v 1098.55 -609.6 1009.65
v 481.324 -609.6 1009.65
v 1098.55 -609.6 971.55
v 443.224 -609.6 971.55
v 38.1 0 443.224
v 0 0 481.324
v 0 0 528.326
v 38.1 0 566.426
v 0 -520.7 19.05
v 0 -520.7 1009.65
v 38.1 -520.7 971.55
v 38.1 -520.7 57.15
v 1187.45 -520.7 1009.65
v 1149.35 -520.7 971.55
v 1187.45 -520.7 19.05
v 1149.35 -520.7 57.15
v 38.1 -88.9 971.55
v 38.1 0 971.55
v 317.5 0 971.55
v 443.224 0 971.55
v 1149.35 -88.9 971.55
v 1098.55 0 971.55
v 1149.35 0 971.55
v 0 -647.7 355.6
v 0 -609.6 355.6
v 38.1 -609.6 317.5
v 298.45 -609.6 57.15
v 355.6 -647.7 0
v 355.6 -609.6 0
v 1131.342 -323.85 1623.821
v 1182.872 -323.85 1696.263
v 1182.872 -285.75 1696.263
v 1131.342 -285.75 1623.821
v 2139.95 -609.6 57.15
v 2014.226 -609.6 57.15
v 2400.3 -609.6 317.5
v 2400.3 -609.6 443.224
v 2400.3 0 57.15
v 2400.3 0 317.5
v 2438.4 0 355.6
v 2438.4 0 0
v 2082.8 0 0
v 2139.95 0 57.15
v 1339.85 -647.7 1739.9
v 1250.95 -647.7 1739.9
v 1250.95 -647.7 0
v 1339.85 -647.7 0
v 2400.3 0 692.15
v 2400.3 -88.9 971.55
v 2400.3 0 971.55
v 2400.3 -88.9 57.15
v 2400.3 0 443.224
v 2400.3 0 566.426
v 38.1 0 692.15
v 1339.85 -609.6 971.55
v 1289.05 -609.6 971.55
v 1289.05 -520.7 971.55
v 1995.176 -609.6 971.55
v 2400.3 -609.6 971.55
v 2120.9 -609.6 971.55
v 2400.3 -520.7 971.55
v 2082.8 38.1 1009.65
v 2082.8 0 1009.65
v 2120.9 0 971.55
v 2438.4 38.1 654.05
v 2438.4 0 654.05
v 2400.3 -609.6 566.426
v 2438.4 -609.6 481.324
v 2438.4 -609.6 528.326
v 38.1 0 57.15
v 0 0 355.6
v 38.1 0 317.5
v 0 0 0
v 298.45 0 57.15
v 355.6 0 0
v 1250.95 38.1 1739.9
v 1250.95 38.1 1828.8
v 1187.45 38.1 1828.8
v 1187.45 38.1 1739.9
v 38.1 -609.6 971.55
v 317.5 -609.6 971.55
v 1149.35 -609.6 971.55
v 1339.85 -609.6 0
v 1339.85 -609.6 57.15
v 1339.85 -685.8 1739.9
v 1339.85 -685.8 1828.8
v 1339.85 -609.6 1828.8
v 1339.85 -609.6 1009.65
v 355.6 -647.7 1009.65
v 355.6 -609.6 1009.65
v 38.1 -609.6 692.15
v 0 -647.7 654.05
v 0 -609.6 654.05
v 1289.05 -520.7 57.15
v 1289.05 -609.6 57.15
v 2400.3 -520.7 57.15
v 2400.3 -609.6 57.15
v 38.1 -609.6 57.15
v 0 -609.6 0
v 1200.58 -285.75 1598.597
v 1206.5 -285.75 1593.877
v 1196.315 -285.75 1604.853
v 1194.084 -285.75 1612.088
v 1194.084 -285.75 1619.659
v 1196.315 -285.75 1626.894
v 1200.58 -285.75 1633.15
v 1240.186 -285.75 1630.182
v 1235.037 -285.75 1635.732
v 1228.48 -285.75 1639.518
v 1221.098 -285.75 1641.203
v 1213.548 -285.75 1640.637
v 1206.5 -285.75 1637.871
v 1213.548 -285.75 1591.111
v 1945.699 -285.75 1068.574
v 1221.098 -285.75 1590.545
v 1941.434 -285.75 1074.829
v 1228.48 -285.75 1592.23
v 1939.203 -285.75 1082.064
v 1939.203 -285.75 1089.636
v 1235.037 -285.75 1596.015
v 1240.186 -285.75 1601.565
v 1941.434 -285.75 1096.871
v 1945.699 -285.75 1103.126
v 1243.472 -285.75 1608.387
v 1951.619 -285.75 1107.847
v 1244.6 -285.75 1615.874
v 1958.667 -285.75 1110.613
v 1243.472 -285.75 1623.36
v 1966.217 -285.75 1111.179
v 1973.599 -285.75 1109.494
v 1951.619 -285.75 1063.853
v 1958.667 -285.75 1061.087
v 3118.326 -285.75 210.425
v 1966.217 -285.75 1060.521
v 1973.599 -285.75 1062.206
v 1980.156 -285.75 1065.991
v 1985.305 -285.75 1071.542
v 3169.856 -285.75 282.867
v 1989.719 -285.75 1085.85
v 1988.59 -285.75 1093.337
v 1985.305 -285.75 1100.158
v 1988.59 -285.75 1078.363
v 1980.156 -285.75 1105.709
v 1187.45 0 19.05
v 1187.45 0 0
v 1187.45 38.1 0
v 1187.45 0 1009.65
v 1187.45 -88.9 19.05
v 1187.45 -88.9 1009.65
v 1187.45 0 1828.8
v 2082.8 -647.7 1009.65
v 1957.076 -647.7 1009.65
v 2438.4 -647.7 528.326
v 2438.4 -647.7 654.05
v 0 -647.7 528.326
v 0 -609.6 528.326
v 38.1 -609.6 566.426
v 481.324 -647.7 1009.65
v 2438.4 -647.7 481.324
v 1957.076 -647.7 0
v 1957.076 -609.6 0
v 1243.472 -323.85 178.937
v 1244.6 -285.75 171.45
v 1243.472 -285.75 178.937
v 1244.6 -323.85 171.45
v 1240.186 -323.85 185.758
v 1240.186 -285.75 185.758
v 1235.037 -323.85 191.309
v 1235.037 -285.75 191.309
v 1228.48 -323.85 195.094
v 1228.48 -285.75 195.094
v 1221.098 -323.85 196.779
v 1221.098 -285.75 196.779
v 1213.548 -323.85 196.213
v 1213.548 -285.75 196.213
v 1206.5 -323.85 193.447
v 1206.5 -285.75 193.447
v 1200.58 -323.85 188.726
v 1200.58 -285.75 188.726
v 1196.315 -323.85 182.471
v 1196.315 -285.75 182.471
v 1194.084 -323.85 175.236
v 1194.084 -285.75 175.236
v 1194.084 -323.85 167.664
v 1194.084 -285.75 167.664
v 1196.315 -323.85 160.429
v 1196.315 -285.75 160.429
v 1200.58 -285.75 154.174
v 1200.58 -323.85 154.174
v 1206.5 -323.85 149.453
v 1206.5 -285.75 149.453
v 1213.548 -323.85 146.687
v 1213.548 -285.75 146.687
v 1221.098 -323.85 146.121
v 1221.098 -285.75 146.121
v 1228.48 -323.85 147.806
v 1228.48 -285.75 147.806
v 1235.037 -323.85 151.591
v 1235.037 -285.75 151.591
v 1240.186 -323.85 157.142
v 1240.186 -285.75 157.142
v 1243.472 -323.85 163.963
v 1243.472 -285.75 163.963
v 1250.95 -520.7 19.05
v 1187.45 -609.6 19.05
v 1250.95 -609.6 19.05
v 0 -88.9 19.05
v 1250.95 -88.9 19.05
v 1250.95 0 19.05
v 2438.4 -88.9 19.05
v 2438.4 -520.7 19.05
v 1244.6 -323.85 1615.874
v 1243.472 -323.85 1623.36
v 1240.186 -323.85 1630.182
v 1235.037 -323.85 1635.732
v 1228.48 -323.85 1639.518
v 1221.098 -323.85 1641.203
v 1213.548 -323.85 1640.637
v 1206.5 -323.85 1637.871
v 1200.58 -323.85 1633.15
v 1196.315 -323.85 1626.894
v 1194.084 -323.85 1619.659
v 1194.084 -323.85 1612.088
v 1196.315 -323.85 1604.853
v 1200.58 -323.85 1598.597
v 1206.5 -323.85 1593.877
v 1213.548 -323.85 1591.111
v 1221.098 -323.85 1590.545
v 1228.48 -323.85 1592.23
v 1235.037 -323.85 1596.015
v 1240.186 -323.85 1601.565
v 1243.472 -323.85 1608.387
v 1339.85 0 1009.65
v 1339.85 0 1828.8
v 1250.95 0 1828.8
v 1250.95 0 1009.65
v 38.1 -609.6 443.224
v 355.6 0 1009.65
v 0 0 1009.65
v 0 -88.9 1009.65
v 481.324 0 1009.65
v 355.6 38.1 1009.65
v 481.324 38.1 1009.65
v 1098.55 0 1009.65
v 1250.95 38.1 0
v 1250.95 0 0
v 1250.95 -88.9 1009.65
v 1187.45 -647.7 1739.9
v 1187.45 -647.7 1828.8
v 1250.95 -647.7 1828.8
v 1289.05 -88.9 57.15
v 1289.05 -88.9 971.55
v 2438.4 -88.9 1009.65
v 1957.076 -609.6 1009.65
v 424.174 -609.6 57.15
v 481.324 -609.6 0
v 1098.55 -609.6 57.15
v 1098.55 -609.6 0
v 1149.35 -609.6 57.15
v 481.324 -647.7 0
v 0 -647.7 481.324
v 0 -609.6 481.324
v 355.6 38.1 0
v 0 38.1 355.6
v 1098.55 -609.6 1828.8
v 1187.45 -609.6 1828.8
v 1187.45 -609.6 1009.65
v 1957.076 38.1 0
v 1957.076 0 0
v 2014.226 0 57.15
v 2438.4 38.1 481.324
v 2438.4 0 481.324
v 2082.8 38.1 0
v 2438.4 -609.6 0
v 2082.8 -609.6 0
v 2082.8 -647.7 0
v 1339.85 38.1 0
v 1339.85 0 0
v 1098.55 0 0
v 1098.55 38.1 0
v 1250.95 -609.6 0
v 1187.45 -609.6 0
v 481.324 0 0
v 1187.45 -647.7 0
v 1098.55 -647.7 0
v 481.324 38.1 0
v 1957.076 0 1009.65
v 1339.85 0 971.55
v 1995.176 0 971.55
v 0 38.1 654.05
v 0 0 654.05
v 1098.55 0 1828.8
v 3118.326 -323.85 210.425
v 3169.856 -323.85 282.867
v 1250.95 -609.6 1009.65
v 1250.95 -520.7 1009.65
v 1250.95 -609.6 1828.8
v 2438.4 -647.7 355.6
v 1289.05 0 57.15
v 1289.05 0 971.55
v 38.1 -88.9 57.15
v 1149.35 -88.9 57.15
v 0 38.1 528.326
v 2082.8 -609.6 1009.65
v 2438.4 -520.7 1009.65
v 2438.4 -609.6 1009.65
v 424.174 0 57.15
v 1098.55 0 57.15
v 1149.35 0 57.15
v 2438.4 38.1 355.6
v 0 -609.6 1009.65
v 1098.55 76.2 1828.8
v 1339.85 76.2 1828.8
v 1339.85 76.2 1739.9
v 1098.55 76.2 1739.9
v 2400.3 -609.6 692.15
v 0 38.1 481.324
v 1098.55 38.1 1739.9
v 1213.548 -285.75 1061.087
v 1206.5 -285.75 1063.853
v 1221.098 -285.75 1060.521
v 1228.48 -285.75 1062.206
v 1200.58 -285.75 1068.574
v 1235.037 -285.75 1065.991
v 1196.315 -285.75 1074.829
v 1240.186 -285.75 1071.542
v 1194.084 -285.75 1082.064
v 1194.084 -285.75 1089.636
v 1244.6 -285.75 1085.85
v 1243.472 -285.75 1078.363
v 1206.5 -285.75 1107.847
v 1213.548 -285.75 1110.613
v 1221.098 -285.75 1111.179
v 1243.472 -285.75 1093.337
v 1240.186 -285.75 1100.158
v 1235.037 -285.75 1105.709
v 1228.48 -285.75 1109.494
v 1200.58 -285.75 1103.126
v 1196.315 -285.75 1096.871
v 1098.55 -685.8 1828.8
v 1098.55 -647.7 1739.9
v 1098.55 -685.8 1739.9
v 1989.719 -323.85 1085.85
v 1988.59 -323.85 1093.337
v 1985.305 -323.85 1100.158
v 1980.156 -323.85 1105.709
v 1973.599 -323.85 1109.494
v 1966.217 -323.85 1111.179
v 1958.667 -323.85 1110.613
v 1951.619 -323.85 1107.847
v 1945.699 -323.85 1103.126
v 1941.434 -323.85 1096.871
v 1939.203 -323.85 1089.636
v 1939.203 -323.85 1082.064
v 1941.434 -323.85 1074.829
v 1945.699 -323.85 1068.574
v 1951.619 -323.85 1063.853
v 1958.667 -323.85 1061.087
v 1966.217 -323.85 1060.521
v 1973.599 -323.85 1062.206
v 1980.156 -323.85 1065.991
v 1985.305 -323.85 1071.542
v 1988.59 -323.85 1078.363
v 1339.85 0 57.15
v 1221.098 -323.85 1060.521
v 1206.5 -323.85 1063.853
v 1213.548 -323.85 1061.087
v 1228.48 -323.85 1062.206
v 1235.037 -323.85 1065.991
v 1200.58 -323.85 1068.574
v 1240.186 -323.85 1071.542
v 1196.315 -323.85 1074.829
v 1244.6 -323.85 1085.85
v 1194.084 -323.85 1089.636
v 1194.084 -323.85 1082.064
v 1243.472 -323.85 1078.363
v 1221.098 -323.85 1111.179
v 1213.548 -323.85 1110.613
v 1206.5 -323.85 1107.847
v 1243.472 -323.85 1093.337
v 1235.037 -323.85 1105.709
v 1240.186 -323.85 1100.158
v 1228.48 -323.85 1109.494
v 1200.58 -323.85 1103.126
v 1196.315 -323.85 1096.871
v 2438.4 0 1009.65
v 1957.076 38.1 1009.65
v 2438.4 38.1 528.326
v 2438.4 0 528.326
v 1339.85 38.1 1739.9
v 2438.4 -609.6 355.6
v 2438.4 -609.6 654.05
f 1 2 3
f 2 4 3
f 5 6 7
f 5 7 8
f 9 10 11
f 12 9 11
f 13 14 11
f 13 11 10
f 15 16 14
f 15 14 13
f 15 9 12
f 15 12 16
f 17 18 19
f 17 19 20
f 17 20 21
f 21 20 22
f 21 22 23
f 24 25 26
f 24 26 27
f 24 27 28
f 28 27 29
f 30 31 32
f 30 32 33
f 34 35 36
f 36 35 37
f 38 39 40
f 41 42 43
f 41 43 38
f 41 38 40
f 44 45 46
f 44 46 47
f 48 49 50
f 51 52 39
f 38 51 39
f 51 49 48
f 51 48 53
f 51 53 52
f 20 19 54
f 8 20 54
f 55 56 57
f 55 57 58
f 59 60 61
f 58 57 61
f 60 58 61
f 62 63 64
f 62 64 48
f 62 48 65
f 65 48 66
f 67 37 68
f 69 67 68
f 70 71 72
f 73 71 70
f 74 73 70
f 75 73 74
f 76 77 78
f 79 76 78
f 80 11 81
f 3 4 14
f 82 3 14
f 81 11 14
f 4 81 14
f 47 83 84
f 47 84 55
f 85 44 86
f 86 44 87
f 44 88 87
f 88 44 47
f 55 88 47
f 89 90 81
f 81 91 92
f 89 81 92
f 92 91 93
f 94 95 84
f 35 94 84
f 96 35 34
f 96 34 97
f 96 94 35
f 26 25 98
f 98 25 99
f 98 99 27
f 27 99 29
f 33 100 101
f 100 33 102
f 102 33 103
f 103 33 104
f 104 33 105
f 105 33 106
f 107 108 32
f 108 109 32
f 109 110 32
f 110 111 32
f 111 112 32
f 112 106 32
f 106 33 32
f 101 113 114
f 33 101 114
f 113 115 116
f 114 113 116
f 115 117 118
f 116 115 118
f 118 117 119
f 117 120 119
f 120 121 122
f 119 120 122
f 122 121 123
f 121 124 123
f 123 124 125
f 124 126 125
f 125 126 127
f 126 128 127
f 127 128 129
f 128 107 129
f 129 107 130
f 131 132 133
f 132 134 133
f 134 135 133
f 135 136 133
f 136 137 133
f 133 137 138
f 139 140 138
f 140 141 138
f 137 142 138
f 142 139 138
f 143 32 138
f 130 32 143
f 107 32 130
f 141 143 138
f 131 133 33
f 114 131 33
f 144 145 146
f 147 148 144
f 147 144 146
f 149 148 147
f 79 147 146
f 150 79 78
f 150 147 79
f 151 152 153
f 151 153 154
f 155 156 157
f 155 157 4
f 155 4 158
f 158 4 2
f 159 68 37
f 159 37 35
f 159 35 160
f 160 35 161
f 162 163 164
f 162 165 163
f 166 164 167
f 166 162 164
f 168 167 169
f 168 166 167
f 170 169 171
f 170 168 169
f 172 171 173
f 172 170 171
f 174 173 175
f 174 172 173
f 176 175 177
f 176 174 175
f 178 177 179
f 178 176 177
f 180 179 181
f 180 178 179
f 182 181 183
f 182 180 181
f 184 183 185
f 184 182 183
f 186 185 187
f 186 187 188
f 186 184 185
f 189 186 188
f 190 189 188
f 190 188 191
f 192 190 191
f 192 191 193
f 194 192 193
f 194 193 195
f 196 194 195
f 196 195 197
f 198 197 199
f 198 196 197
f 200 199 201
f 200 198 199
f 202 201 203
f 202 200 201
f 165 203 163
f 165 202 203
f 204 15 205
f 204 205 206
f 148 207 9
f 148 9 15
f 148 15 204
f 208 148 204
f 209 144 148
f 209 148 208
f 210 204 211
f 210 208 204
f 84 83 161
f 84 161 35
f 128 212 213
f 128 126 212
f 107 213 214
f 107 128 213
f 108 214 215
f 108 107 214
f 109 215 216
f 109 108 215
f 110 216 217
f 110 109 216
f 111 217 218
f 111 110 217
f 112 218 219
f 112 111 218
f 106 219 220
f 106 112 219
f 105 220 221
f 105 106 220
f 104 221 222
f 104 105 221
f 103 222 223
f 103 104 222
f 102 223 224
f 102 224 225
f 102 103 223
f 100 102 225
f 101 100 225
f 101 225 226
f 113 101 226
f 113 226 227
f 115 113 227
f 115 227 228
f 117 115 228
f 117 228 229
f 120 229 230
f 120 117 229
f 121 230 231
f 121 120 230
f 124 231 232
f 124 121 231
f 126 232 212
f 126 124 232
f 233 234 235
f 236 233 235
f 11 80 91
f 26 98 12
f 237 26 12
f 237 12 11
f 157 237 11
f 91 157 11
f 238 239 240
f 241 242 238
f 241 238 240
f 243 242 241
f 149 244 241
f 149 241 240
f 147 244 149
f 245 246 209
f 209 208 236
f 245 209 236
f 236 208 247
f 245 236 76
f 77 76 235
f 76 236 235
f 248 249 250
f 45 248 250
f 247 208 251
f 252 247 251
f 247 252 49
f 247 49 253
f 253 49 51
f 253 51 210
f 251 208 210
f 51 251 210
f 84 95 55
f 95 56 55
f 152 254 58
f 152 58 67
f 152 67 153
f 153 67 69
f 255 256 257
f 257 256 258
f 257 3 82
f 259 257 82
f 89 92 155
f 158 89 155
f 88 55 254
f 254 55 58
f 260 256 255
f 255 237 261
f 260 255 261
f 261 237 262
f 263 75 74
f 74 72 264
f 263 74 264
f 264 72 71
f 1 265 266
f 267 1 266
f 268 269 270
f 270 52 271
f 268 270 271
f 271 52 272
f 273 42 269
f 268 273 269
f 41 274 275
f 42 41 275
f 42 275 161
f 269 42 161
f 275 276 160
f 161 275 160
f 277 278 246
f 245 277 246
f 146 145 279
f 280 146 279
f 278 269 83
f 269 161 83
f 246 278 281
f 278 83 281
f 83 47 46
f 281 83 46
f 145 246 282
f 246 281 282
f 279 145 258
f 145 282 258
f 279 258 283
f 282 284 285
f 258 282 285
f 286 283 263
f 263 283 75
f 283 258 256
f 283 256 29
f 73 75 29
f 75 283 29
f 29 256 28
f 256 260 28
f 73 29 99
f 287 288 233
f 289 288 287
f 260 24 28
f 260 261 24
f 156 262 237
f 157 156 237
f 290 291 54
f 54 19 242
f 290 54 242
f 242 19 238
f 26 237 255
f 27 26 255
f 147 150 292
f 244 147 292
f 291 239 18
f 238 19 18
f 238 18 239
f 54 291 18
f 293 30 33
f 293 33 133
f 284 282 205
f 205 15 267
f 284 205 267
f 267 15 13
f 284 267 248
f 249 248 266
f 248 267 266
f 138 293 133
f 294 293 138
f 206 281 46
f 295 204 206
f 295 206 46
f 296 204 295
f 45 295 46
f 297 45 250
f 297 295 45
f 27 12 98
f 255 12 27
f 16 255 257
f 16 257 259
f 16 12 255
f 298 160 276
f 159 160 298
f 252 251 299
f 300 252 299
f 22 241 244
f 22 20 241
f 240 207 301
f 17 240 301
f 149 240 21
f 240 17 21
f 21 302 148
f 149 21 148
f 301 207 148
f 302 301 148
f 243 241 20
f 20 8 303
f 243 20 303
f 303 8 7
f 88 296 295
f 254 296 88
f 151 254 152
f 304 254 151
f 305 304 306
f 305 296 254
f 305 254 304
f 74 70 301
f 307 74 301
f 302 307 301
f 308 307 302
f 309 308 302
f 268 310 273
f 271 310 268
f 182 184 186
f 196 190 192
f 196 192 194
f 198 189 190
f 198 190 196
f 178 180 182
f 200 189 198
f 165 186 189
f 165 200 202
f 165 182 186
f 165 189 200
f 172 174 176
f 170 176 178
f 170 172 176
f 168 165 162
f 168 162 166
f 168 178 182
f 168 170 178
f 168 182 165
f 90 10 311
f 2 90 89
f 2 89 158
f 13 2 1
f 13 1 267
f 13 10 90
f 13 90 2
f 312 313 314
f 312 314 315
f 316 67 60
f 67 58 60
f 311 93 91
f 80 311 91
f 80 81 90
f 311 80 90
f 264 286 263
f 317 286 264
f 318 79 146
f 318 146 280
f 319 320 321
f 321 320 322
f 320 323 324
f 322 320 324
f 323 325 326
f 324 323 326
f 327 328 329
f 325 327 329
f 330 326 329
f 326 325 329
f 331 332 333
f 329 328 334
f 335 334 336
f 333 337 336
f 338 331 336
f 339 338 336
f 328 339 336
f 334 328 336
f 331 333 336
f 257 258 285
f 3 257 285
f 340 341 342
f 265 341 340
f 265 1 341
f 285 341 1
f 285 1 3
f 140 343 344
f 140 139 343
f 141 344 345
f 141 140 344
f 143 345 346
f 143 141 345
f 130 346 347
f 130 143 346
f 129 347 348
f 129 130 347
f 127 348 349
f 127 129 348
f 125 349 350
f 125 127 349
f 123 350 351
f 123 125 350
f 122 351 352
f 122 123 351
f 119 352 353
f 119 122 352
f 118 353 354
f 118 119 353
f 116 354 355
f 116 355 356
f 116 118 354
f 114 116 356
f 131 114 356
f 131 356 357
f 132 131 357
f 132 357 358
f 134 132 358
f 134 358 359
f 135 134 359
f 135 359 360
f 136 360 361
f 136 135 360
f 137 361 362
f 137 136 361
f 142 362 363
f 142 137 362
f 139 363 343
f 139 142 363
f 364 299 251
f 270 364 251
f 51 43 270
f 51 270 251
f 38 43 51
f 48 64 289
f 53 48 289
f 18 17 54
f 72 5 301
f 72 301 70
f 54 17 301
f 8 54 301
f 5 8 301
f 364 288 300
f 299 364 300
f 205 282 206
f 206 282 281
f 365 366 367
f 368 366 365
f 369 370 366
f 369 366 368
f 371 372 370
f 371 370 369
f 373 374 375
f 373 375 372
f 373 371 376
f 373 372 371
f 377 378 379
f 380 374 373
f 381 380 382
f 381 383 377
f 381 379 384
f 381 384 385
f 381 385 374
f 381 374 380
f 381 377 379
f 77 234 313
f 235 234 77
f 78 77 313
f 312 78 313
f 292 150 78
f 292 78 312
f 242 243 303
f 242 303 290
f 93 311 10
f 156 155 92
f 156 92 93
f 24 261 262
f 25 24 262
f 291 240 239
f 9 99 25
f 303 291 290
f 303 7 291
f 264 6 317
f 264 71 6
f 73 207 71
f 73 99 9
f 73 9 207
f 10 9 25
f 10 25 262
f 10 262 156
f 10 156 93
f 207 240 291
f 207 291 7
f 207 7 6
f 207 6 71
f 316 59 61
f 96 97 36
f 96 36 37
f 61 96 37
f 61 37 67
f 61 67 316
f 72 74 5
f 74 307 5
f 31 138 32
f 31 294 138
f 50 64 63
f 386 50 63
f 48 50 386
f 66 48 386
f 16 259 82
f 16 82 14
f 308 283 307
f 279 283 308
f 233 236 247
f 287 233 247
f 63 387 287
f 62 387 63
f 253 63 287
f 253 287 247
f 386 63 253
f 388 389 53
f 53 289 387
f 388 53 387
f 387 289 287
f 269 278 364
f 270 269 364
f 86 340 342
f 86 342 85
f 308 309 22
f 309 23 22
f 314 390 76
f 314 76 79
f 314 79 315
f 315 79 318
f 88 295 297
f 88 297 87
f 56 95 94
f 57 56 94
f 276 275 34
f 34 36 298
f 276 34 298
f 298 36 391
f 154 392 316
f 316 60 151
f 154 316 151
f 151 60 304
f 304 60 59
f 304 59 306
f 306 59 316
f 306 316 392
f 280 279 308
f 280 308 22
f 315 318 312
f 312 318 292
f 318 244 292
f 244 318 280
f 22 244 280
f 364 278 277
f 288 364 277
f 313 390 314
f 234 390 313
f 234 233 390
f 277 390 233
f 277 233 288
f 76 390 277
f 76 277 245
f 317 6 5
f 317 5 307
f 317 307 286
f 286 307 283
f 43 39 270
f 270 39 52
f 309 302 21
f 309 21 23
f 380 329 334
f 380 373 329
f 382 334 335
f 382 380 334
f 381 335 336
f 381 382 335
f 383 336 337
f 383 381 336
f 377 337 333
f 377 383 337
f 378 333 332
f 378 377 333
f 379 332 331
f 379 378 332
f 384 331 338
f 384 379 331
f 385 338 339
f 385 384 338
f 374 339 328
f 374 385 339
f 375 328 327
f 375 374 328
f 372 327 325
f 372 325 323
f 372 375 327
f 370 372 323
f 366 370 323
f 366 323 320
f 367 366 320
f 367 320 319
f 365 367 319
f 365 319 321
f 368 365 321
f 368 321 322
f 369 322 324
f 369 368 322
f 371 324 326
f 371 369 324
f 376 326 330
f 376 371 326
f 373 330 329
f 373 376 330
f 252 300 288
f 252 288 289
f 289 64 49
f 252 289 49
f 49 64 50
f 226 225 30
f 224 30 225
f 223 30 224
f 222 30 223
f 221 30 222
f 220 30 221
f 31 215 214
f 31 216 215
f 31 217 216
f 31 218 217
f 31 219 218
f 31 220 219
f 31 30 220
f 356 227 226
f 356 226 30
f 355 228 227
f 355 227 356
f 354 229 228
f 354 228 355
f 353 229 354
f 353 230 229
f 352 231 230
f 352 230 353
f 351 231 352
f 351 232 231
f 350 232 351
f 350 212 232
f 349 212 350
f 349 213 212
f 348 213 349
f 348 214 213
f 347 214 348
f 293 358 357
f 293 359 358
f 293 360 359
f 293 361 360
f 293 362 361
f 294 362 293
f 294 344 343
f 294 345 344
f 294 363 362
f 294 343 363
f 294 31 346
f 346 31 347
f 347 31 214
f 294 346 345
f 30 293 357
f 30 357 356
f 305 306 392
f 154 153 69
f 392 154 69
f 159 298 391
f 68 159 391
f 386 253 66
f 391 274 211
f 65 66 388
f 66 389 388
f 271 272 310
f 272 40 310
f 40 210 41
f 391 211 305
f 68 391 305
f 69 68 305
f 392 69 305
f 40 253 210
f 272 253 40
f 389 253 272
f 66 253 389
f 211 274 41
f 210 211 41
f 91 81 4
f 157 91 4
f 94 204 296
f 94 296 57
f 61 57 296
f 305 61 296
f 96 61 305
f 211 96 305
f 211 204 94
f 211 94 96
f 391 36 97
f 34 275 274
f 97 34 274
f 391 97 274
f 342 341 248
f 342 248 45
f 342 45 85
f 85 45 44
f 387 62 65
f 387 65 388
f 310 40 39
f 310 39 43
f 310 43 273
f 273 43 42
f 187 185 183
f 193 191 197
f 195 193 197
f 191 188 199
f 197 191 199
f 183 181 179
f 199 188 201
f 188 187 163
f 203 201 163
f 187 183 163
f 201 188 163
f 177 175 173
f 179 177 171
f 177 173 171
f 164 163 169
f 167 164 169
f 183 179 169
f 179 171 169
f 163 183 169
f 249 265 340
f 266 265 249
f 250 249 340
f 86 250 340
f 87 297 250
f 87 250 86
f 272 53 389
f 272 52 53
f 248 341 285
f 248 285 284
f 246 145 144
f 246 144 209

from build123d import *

# Parameters (mm, degrees)
F0_W      = 2438.4
F0_H      = 609.6
F1_DEPTH  = 19.05
F2_W      = 1187.45
F2_H      = 88.9
F3_DEPTH  = 38.1
F4_W      = 38.1
F4_H      = 88.9
F5_DEPTH  = 914.4
F6_W      = 1187.45
F6_H      = 88.9
F7_DEPTH  = 38.1
F8_W      = 88.9
F8_H      = 1828.8
F9_DEPTH  = 38.1
F10_W     = 88.9
F10_H     = 1828.8
F11_DEPTH = 38.1
F12_W     = 241.3
F12_H     = 88.9
F13_DEPTH = 38.1
F14_W     = 241.3
F14_H     = 88.9
F15_DEPTH = 38.1
F17_R     = 25.4
F18_DEPTH = 19.05


with BuildPart() as f1:
    # F0 (on Top) → F1 (new body)
    with BuildSketch(Plane.XY):
        with Locations((1219.2, -304.8)):
            Rectangle(F0_W, F0_H)
    extrude(amount=F1_DEPTH)

    # F2 (on face) → F3 (join)
    with BuildSketch(Plane.XY.offset(19.05)):
        with Locations((593.725, -44.45)):
            Rectangle(F2_W, F2_H)
        with Locations((1844.675, -44.45)):
            Rectangle(F2_W, F2_H)
        with Locations((593.725, -565.15)):
            Rectangle(F2_W, F2_H)
        with Locations((1844.675, -565.15)):
            Rectangle(F2_W, F2_H)
    extrude(amount=F3_DEPTH)

    # F4 (on face) → F5 (join)
    with BuildSketch(Plane.XY.offset(57.15)):
        with Locations((19.05, -44.45)):
            Rectangle(F4_W, F4_H)
        with Locations((1168.4, -44.45)):
            Rectangle(F4_W, F4_H)
        with Locations((1168.4, -565.15)):
            Rectangle(F4_W, F4_H)
        with Locations((19.05, -565.15)):
            Rectangle(F4_W, F4_H)
        with Locations((1270, -44.45)):
            Rectangle(F4_W, F4_H)
        with Locations((1270, -565.15)):
            Rectangle(F4_W, F4_H)
        with Locations((2419.35, -565.15)):
            Rectangle(F4_W, F4_H)
        with Locations((2419.35, -44.45)):
            Rectangle(F4_W, F4_H)
    extrude(amount=F5_DEPTH)

    # F6 (on face) → F7 (join)
    with BuildSketch(Plane.XY.offset(971.55)):
        with Locations((593.725, -44.45)):
            Rectangle(F6_W, F6_H)
        with Locations((1844.675, -44.45)):
            Rectangle(F6_W, F6_H)
        with Locations((1844.675, -565.15)):
            Rectangle(F6_W, F6_H)
        with Locations((593.725, -565.15)):
            Rectangle(F6_W, F6_H)
    extrude(amount=F7_DEPTH)

    # F8 (on face) → F9 (join)
    with BuildSketch(Plane.XZ.offset(609.6)):
        with Locations((1295.4, 914.4)):
            Rectangle(F8_W, F8_H)
        Polygon((2438.4, 654.05), (2082.8, 1009.65), (1957.076414305, 1009.65), (2438.4, 528.326414305), align=None)
        Polygon((2438.4, 355.6), (2438.4, 481.323585695), (1957.076414305, 0), (2082.8, 0), align=None)
        Polygon((0, 355.6), (355.6, 0), (481.323585695, 0), (0, 481.323585695), align=None)
        Polygon((481.323585695, 1009.65), (355.6, 1009.65), (0, 654.05), (0, 528.326414305), align=None)
        with Locations((1143, 914.4)):
            Rectangle(F8_W, F8_H)
    extrude(amount=F9_DEPTH)

    # F10 (on face) → F11 (join)
    with BuildSketch(Plane(origin=(0, 0, 0), x_dir=(-1, 0, 0), z_dir=(0, 1, 0))):
        with Locations((-1143, 914.4)):
            Rectangle(F10_W, F10_H)
        Polygon((0, 654.05), (-355.6, 1009.65), (-481.323585695, 1009.65), (0, 528.326414305), align=None)
        Polygon((0, 355.6), (0, 481.323585695), (-481.323585695, 0), (-355.6, 0), align=None)
        Polygon((-2438.4, 355.6), (-2082.8, 0), (-1957.076414305, 0), (-2438.4, 481.323585695), align=None)
        Polygon((-1957.076414305, 1009.65), (-2082.8, 1009.65), (-2438.4, 654.05), (-2438.4, 528.326414305), align=None)
        with Locations((-1295.4, 914.4)):
            Rectangle(F10_W, F10_H)
    extrude(amount=F11_DEPTH)

    # F12 (on face) → F13 (join)
    with BuildSketch(Plane(origin=(0, 38.1, 0), x_dir=(-1, 0, 0), z_dir=(0, 1, 0))):
        with Locations((-1219.2, 1784.35)):
            Rectangle(F12_W, F12_H)
    extrude(amount=F13_DEPTH)

    # F14 (on face) → F15 (join)
    with BuildSketch(Plane.XZ.offset(647.7)):
        with Locations((1219.2, 1784.35)):
            Rectangle(F14_W, F14_H)
    extrude(amount=F15_DEPTH)


with BuildPart() as f18:
    # F17 (on offset) → F18 (new body, symmetric)
    with BuildSketch(Plane.XZ.offset(304.8)):
        Polygon((3169.8556301289, 282.8668585002), (1182.8717964555, 1696.2634074986), (1131.3417139399, 1623.8212885626), (3118.3255476133, 210.4247395642), align=None)
        with Locations((1964.3189376275, 1085.85)):
            Circle(F17_R, mode=Mode.SUBTRACT)
        with Locations((1219.2, 1615.8737058744)):
            Circle(F17_R, mode=Mode.SUBTRACT)
    extrude(amount=F18_DEPTH, both=True)


with BuildPart() as f18b:
    # F17 (on offset) → F18, piece 2 (new body, symmetric)
    with BuildSketch(Plane.XZ.offset(304.8)):
        with Locations((1219.2, 1085.85)):
            Circle(F17_R)
    extrude(amount=F18_DEPTH, both=True)


with BuildPart() as f18c:
    # F17 (on offset) → F18, piece 3 (new body, symmetric)
    with BuildSketch(Plane.XZ.offset(304.8)):
        with Locations((1219.2, 171.45)):
            Circle(F17_R)
    extrude(amount=F18_DEPTH, both=True)


solid = Compound([f1.part, f18.part, f18b.part, f18c.part])
